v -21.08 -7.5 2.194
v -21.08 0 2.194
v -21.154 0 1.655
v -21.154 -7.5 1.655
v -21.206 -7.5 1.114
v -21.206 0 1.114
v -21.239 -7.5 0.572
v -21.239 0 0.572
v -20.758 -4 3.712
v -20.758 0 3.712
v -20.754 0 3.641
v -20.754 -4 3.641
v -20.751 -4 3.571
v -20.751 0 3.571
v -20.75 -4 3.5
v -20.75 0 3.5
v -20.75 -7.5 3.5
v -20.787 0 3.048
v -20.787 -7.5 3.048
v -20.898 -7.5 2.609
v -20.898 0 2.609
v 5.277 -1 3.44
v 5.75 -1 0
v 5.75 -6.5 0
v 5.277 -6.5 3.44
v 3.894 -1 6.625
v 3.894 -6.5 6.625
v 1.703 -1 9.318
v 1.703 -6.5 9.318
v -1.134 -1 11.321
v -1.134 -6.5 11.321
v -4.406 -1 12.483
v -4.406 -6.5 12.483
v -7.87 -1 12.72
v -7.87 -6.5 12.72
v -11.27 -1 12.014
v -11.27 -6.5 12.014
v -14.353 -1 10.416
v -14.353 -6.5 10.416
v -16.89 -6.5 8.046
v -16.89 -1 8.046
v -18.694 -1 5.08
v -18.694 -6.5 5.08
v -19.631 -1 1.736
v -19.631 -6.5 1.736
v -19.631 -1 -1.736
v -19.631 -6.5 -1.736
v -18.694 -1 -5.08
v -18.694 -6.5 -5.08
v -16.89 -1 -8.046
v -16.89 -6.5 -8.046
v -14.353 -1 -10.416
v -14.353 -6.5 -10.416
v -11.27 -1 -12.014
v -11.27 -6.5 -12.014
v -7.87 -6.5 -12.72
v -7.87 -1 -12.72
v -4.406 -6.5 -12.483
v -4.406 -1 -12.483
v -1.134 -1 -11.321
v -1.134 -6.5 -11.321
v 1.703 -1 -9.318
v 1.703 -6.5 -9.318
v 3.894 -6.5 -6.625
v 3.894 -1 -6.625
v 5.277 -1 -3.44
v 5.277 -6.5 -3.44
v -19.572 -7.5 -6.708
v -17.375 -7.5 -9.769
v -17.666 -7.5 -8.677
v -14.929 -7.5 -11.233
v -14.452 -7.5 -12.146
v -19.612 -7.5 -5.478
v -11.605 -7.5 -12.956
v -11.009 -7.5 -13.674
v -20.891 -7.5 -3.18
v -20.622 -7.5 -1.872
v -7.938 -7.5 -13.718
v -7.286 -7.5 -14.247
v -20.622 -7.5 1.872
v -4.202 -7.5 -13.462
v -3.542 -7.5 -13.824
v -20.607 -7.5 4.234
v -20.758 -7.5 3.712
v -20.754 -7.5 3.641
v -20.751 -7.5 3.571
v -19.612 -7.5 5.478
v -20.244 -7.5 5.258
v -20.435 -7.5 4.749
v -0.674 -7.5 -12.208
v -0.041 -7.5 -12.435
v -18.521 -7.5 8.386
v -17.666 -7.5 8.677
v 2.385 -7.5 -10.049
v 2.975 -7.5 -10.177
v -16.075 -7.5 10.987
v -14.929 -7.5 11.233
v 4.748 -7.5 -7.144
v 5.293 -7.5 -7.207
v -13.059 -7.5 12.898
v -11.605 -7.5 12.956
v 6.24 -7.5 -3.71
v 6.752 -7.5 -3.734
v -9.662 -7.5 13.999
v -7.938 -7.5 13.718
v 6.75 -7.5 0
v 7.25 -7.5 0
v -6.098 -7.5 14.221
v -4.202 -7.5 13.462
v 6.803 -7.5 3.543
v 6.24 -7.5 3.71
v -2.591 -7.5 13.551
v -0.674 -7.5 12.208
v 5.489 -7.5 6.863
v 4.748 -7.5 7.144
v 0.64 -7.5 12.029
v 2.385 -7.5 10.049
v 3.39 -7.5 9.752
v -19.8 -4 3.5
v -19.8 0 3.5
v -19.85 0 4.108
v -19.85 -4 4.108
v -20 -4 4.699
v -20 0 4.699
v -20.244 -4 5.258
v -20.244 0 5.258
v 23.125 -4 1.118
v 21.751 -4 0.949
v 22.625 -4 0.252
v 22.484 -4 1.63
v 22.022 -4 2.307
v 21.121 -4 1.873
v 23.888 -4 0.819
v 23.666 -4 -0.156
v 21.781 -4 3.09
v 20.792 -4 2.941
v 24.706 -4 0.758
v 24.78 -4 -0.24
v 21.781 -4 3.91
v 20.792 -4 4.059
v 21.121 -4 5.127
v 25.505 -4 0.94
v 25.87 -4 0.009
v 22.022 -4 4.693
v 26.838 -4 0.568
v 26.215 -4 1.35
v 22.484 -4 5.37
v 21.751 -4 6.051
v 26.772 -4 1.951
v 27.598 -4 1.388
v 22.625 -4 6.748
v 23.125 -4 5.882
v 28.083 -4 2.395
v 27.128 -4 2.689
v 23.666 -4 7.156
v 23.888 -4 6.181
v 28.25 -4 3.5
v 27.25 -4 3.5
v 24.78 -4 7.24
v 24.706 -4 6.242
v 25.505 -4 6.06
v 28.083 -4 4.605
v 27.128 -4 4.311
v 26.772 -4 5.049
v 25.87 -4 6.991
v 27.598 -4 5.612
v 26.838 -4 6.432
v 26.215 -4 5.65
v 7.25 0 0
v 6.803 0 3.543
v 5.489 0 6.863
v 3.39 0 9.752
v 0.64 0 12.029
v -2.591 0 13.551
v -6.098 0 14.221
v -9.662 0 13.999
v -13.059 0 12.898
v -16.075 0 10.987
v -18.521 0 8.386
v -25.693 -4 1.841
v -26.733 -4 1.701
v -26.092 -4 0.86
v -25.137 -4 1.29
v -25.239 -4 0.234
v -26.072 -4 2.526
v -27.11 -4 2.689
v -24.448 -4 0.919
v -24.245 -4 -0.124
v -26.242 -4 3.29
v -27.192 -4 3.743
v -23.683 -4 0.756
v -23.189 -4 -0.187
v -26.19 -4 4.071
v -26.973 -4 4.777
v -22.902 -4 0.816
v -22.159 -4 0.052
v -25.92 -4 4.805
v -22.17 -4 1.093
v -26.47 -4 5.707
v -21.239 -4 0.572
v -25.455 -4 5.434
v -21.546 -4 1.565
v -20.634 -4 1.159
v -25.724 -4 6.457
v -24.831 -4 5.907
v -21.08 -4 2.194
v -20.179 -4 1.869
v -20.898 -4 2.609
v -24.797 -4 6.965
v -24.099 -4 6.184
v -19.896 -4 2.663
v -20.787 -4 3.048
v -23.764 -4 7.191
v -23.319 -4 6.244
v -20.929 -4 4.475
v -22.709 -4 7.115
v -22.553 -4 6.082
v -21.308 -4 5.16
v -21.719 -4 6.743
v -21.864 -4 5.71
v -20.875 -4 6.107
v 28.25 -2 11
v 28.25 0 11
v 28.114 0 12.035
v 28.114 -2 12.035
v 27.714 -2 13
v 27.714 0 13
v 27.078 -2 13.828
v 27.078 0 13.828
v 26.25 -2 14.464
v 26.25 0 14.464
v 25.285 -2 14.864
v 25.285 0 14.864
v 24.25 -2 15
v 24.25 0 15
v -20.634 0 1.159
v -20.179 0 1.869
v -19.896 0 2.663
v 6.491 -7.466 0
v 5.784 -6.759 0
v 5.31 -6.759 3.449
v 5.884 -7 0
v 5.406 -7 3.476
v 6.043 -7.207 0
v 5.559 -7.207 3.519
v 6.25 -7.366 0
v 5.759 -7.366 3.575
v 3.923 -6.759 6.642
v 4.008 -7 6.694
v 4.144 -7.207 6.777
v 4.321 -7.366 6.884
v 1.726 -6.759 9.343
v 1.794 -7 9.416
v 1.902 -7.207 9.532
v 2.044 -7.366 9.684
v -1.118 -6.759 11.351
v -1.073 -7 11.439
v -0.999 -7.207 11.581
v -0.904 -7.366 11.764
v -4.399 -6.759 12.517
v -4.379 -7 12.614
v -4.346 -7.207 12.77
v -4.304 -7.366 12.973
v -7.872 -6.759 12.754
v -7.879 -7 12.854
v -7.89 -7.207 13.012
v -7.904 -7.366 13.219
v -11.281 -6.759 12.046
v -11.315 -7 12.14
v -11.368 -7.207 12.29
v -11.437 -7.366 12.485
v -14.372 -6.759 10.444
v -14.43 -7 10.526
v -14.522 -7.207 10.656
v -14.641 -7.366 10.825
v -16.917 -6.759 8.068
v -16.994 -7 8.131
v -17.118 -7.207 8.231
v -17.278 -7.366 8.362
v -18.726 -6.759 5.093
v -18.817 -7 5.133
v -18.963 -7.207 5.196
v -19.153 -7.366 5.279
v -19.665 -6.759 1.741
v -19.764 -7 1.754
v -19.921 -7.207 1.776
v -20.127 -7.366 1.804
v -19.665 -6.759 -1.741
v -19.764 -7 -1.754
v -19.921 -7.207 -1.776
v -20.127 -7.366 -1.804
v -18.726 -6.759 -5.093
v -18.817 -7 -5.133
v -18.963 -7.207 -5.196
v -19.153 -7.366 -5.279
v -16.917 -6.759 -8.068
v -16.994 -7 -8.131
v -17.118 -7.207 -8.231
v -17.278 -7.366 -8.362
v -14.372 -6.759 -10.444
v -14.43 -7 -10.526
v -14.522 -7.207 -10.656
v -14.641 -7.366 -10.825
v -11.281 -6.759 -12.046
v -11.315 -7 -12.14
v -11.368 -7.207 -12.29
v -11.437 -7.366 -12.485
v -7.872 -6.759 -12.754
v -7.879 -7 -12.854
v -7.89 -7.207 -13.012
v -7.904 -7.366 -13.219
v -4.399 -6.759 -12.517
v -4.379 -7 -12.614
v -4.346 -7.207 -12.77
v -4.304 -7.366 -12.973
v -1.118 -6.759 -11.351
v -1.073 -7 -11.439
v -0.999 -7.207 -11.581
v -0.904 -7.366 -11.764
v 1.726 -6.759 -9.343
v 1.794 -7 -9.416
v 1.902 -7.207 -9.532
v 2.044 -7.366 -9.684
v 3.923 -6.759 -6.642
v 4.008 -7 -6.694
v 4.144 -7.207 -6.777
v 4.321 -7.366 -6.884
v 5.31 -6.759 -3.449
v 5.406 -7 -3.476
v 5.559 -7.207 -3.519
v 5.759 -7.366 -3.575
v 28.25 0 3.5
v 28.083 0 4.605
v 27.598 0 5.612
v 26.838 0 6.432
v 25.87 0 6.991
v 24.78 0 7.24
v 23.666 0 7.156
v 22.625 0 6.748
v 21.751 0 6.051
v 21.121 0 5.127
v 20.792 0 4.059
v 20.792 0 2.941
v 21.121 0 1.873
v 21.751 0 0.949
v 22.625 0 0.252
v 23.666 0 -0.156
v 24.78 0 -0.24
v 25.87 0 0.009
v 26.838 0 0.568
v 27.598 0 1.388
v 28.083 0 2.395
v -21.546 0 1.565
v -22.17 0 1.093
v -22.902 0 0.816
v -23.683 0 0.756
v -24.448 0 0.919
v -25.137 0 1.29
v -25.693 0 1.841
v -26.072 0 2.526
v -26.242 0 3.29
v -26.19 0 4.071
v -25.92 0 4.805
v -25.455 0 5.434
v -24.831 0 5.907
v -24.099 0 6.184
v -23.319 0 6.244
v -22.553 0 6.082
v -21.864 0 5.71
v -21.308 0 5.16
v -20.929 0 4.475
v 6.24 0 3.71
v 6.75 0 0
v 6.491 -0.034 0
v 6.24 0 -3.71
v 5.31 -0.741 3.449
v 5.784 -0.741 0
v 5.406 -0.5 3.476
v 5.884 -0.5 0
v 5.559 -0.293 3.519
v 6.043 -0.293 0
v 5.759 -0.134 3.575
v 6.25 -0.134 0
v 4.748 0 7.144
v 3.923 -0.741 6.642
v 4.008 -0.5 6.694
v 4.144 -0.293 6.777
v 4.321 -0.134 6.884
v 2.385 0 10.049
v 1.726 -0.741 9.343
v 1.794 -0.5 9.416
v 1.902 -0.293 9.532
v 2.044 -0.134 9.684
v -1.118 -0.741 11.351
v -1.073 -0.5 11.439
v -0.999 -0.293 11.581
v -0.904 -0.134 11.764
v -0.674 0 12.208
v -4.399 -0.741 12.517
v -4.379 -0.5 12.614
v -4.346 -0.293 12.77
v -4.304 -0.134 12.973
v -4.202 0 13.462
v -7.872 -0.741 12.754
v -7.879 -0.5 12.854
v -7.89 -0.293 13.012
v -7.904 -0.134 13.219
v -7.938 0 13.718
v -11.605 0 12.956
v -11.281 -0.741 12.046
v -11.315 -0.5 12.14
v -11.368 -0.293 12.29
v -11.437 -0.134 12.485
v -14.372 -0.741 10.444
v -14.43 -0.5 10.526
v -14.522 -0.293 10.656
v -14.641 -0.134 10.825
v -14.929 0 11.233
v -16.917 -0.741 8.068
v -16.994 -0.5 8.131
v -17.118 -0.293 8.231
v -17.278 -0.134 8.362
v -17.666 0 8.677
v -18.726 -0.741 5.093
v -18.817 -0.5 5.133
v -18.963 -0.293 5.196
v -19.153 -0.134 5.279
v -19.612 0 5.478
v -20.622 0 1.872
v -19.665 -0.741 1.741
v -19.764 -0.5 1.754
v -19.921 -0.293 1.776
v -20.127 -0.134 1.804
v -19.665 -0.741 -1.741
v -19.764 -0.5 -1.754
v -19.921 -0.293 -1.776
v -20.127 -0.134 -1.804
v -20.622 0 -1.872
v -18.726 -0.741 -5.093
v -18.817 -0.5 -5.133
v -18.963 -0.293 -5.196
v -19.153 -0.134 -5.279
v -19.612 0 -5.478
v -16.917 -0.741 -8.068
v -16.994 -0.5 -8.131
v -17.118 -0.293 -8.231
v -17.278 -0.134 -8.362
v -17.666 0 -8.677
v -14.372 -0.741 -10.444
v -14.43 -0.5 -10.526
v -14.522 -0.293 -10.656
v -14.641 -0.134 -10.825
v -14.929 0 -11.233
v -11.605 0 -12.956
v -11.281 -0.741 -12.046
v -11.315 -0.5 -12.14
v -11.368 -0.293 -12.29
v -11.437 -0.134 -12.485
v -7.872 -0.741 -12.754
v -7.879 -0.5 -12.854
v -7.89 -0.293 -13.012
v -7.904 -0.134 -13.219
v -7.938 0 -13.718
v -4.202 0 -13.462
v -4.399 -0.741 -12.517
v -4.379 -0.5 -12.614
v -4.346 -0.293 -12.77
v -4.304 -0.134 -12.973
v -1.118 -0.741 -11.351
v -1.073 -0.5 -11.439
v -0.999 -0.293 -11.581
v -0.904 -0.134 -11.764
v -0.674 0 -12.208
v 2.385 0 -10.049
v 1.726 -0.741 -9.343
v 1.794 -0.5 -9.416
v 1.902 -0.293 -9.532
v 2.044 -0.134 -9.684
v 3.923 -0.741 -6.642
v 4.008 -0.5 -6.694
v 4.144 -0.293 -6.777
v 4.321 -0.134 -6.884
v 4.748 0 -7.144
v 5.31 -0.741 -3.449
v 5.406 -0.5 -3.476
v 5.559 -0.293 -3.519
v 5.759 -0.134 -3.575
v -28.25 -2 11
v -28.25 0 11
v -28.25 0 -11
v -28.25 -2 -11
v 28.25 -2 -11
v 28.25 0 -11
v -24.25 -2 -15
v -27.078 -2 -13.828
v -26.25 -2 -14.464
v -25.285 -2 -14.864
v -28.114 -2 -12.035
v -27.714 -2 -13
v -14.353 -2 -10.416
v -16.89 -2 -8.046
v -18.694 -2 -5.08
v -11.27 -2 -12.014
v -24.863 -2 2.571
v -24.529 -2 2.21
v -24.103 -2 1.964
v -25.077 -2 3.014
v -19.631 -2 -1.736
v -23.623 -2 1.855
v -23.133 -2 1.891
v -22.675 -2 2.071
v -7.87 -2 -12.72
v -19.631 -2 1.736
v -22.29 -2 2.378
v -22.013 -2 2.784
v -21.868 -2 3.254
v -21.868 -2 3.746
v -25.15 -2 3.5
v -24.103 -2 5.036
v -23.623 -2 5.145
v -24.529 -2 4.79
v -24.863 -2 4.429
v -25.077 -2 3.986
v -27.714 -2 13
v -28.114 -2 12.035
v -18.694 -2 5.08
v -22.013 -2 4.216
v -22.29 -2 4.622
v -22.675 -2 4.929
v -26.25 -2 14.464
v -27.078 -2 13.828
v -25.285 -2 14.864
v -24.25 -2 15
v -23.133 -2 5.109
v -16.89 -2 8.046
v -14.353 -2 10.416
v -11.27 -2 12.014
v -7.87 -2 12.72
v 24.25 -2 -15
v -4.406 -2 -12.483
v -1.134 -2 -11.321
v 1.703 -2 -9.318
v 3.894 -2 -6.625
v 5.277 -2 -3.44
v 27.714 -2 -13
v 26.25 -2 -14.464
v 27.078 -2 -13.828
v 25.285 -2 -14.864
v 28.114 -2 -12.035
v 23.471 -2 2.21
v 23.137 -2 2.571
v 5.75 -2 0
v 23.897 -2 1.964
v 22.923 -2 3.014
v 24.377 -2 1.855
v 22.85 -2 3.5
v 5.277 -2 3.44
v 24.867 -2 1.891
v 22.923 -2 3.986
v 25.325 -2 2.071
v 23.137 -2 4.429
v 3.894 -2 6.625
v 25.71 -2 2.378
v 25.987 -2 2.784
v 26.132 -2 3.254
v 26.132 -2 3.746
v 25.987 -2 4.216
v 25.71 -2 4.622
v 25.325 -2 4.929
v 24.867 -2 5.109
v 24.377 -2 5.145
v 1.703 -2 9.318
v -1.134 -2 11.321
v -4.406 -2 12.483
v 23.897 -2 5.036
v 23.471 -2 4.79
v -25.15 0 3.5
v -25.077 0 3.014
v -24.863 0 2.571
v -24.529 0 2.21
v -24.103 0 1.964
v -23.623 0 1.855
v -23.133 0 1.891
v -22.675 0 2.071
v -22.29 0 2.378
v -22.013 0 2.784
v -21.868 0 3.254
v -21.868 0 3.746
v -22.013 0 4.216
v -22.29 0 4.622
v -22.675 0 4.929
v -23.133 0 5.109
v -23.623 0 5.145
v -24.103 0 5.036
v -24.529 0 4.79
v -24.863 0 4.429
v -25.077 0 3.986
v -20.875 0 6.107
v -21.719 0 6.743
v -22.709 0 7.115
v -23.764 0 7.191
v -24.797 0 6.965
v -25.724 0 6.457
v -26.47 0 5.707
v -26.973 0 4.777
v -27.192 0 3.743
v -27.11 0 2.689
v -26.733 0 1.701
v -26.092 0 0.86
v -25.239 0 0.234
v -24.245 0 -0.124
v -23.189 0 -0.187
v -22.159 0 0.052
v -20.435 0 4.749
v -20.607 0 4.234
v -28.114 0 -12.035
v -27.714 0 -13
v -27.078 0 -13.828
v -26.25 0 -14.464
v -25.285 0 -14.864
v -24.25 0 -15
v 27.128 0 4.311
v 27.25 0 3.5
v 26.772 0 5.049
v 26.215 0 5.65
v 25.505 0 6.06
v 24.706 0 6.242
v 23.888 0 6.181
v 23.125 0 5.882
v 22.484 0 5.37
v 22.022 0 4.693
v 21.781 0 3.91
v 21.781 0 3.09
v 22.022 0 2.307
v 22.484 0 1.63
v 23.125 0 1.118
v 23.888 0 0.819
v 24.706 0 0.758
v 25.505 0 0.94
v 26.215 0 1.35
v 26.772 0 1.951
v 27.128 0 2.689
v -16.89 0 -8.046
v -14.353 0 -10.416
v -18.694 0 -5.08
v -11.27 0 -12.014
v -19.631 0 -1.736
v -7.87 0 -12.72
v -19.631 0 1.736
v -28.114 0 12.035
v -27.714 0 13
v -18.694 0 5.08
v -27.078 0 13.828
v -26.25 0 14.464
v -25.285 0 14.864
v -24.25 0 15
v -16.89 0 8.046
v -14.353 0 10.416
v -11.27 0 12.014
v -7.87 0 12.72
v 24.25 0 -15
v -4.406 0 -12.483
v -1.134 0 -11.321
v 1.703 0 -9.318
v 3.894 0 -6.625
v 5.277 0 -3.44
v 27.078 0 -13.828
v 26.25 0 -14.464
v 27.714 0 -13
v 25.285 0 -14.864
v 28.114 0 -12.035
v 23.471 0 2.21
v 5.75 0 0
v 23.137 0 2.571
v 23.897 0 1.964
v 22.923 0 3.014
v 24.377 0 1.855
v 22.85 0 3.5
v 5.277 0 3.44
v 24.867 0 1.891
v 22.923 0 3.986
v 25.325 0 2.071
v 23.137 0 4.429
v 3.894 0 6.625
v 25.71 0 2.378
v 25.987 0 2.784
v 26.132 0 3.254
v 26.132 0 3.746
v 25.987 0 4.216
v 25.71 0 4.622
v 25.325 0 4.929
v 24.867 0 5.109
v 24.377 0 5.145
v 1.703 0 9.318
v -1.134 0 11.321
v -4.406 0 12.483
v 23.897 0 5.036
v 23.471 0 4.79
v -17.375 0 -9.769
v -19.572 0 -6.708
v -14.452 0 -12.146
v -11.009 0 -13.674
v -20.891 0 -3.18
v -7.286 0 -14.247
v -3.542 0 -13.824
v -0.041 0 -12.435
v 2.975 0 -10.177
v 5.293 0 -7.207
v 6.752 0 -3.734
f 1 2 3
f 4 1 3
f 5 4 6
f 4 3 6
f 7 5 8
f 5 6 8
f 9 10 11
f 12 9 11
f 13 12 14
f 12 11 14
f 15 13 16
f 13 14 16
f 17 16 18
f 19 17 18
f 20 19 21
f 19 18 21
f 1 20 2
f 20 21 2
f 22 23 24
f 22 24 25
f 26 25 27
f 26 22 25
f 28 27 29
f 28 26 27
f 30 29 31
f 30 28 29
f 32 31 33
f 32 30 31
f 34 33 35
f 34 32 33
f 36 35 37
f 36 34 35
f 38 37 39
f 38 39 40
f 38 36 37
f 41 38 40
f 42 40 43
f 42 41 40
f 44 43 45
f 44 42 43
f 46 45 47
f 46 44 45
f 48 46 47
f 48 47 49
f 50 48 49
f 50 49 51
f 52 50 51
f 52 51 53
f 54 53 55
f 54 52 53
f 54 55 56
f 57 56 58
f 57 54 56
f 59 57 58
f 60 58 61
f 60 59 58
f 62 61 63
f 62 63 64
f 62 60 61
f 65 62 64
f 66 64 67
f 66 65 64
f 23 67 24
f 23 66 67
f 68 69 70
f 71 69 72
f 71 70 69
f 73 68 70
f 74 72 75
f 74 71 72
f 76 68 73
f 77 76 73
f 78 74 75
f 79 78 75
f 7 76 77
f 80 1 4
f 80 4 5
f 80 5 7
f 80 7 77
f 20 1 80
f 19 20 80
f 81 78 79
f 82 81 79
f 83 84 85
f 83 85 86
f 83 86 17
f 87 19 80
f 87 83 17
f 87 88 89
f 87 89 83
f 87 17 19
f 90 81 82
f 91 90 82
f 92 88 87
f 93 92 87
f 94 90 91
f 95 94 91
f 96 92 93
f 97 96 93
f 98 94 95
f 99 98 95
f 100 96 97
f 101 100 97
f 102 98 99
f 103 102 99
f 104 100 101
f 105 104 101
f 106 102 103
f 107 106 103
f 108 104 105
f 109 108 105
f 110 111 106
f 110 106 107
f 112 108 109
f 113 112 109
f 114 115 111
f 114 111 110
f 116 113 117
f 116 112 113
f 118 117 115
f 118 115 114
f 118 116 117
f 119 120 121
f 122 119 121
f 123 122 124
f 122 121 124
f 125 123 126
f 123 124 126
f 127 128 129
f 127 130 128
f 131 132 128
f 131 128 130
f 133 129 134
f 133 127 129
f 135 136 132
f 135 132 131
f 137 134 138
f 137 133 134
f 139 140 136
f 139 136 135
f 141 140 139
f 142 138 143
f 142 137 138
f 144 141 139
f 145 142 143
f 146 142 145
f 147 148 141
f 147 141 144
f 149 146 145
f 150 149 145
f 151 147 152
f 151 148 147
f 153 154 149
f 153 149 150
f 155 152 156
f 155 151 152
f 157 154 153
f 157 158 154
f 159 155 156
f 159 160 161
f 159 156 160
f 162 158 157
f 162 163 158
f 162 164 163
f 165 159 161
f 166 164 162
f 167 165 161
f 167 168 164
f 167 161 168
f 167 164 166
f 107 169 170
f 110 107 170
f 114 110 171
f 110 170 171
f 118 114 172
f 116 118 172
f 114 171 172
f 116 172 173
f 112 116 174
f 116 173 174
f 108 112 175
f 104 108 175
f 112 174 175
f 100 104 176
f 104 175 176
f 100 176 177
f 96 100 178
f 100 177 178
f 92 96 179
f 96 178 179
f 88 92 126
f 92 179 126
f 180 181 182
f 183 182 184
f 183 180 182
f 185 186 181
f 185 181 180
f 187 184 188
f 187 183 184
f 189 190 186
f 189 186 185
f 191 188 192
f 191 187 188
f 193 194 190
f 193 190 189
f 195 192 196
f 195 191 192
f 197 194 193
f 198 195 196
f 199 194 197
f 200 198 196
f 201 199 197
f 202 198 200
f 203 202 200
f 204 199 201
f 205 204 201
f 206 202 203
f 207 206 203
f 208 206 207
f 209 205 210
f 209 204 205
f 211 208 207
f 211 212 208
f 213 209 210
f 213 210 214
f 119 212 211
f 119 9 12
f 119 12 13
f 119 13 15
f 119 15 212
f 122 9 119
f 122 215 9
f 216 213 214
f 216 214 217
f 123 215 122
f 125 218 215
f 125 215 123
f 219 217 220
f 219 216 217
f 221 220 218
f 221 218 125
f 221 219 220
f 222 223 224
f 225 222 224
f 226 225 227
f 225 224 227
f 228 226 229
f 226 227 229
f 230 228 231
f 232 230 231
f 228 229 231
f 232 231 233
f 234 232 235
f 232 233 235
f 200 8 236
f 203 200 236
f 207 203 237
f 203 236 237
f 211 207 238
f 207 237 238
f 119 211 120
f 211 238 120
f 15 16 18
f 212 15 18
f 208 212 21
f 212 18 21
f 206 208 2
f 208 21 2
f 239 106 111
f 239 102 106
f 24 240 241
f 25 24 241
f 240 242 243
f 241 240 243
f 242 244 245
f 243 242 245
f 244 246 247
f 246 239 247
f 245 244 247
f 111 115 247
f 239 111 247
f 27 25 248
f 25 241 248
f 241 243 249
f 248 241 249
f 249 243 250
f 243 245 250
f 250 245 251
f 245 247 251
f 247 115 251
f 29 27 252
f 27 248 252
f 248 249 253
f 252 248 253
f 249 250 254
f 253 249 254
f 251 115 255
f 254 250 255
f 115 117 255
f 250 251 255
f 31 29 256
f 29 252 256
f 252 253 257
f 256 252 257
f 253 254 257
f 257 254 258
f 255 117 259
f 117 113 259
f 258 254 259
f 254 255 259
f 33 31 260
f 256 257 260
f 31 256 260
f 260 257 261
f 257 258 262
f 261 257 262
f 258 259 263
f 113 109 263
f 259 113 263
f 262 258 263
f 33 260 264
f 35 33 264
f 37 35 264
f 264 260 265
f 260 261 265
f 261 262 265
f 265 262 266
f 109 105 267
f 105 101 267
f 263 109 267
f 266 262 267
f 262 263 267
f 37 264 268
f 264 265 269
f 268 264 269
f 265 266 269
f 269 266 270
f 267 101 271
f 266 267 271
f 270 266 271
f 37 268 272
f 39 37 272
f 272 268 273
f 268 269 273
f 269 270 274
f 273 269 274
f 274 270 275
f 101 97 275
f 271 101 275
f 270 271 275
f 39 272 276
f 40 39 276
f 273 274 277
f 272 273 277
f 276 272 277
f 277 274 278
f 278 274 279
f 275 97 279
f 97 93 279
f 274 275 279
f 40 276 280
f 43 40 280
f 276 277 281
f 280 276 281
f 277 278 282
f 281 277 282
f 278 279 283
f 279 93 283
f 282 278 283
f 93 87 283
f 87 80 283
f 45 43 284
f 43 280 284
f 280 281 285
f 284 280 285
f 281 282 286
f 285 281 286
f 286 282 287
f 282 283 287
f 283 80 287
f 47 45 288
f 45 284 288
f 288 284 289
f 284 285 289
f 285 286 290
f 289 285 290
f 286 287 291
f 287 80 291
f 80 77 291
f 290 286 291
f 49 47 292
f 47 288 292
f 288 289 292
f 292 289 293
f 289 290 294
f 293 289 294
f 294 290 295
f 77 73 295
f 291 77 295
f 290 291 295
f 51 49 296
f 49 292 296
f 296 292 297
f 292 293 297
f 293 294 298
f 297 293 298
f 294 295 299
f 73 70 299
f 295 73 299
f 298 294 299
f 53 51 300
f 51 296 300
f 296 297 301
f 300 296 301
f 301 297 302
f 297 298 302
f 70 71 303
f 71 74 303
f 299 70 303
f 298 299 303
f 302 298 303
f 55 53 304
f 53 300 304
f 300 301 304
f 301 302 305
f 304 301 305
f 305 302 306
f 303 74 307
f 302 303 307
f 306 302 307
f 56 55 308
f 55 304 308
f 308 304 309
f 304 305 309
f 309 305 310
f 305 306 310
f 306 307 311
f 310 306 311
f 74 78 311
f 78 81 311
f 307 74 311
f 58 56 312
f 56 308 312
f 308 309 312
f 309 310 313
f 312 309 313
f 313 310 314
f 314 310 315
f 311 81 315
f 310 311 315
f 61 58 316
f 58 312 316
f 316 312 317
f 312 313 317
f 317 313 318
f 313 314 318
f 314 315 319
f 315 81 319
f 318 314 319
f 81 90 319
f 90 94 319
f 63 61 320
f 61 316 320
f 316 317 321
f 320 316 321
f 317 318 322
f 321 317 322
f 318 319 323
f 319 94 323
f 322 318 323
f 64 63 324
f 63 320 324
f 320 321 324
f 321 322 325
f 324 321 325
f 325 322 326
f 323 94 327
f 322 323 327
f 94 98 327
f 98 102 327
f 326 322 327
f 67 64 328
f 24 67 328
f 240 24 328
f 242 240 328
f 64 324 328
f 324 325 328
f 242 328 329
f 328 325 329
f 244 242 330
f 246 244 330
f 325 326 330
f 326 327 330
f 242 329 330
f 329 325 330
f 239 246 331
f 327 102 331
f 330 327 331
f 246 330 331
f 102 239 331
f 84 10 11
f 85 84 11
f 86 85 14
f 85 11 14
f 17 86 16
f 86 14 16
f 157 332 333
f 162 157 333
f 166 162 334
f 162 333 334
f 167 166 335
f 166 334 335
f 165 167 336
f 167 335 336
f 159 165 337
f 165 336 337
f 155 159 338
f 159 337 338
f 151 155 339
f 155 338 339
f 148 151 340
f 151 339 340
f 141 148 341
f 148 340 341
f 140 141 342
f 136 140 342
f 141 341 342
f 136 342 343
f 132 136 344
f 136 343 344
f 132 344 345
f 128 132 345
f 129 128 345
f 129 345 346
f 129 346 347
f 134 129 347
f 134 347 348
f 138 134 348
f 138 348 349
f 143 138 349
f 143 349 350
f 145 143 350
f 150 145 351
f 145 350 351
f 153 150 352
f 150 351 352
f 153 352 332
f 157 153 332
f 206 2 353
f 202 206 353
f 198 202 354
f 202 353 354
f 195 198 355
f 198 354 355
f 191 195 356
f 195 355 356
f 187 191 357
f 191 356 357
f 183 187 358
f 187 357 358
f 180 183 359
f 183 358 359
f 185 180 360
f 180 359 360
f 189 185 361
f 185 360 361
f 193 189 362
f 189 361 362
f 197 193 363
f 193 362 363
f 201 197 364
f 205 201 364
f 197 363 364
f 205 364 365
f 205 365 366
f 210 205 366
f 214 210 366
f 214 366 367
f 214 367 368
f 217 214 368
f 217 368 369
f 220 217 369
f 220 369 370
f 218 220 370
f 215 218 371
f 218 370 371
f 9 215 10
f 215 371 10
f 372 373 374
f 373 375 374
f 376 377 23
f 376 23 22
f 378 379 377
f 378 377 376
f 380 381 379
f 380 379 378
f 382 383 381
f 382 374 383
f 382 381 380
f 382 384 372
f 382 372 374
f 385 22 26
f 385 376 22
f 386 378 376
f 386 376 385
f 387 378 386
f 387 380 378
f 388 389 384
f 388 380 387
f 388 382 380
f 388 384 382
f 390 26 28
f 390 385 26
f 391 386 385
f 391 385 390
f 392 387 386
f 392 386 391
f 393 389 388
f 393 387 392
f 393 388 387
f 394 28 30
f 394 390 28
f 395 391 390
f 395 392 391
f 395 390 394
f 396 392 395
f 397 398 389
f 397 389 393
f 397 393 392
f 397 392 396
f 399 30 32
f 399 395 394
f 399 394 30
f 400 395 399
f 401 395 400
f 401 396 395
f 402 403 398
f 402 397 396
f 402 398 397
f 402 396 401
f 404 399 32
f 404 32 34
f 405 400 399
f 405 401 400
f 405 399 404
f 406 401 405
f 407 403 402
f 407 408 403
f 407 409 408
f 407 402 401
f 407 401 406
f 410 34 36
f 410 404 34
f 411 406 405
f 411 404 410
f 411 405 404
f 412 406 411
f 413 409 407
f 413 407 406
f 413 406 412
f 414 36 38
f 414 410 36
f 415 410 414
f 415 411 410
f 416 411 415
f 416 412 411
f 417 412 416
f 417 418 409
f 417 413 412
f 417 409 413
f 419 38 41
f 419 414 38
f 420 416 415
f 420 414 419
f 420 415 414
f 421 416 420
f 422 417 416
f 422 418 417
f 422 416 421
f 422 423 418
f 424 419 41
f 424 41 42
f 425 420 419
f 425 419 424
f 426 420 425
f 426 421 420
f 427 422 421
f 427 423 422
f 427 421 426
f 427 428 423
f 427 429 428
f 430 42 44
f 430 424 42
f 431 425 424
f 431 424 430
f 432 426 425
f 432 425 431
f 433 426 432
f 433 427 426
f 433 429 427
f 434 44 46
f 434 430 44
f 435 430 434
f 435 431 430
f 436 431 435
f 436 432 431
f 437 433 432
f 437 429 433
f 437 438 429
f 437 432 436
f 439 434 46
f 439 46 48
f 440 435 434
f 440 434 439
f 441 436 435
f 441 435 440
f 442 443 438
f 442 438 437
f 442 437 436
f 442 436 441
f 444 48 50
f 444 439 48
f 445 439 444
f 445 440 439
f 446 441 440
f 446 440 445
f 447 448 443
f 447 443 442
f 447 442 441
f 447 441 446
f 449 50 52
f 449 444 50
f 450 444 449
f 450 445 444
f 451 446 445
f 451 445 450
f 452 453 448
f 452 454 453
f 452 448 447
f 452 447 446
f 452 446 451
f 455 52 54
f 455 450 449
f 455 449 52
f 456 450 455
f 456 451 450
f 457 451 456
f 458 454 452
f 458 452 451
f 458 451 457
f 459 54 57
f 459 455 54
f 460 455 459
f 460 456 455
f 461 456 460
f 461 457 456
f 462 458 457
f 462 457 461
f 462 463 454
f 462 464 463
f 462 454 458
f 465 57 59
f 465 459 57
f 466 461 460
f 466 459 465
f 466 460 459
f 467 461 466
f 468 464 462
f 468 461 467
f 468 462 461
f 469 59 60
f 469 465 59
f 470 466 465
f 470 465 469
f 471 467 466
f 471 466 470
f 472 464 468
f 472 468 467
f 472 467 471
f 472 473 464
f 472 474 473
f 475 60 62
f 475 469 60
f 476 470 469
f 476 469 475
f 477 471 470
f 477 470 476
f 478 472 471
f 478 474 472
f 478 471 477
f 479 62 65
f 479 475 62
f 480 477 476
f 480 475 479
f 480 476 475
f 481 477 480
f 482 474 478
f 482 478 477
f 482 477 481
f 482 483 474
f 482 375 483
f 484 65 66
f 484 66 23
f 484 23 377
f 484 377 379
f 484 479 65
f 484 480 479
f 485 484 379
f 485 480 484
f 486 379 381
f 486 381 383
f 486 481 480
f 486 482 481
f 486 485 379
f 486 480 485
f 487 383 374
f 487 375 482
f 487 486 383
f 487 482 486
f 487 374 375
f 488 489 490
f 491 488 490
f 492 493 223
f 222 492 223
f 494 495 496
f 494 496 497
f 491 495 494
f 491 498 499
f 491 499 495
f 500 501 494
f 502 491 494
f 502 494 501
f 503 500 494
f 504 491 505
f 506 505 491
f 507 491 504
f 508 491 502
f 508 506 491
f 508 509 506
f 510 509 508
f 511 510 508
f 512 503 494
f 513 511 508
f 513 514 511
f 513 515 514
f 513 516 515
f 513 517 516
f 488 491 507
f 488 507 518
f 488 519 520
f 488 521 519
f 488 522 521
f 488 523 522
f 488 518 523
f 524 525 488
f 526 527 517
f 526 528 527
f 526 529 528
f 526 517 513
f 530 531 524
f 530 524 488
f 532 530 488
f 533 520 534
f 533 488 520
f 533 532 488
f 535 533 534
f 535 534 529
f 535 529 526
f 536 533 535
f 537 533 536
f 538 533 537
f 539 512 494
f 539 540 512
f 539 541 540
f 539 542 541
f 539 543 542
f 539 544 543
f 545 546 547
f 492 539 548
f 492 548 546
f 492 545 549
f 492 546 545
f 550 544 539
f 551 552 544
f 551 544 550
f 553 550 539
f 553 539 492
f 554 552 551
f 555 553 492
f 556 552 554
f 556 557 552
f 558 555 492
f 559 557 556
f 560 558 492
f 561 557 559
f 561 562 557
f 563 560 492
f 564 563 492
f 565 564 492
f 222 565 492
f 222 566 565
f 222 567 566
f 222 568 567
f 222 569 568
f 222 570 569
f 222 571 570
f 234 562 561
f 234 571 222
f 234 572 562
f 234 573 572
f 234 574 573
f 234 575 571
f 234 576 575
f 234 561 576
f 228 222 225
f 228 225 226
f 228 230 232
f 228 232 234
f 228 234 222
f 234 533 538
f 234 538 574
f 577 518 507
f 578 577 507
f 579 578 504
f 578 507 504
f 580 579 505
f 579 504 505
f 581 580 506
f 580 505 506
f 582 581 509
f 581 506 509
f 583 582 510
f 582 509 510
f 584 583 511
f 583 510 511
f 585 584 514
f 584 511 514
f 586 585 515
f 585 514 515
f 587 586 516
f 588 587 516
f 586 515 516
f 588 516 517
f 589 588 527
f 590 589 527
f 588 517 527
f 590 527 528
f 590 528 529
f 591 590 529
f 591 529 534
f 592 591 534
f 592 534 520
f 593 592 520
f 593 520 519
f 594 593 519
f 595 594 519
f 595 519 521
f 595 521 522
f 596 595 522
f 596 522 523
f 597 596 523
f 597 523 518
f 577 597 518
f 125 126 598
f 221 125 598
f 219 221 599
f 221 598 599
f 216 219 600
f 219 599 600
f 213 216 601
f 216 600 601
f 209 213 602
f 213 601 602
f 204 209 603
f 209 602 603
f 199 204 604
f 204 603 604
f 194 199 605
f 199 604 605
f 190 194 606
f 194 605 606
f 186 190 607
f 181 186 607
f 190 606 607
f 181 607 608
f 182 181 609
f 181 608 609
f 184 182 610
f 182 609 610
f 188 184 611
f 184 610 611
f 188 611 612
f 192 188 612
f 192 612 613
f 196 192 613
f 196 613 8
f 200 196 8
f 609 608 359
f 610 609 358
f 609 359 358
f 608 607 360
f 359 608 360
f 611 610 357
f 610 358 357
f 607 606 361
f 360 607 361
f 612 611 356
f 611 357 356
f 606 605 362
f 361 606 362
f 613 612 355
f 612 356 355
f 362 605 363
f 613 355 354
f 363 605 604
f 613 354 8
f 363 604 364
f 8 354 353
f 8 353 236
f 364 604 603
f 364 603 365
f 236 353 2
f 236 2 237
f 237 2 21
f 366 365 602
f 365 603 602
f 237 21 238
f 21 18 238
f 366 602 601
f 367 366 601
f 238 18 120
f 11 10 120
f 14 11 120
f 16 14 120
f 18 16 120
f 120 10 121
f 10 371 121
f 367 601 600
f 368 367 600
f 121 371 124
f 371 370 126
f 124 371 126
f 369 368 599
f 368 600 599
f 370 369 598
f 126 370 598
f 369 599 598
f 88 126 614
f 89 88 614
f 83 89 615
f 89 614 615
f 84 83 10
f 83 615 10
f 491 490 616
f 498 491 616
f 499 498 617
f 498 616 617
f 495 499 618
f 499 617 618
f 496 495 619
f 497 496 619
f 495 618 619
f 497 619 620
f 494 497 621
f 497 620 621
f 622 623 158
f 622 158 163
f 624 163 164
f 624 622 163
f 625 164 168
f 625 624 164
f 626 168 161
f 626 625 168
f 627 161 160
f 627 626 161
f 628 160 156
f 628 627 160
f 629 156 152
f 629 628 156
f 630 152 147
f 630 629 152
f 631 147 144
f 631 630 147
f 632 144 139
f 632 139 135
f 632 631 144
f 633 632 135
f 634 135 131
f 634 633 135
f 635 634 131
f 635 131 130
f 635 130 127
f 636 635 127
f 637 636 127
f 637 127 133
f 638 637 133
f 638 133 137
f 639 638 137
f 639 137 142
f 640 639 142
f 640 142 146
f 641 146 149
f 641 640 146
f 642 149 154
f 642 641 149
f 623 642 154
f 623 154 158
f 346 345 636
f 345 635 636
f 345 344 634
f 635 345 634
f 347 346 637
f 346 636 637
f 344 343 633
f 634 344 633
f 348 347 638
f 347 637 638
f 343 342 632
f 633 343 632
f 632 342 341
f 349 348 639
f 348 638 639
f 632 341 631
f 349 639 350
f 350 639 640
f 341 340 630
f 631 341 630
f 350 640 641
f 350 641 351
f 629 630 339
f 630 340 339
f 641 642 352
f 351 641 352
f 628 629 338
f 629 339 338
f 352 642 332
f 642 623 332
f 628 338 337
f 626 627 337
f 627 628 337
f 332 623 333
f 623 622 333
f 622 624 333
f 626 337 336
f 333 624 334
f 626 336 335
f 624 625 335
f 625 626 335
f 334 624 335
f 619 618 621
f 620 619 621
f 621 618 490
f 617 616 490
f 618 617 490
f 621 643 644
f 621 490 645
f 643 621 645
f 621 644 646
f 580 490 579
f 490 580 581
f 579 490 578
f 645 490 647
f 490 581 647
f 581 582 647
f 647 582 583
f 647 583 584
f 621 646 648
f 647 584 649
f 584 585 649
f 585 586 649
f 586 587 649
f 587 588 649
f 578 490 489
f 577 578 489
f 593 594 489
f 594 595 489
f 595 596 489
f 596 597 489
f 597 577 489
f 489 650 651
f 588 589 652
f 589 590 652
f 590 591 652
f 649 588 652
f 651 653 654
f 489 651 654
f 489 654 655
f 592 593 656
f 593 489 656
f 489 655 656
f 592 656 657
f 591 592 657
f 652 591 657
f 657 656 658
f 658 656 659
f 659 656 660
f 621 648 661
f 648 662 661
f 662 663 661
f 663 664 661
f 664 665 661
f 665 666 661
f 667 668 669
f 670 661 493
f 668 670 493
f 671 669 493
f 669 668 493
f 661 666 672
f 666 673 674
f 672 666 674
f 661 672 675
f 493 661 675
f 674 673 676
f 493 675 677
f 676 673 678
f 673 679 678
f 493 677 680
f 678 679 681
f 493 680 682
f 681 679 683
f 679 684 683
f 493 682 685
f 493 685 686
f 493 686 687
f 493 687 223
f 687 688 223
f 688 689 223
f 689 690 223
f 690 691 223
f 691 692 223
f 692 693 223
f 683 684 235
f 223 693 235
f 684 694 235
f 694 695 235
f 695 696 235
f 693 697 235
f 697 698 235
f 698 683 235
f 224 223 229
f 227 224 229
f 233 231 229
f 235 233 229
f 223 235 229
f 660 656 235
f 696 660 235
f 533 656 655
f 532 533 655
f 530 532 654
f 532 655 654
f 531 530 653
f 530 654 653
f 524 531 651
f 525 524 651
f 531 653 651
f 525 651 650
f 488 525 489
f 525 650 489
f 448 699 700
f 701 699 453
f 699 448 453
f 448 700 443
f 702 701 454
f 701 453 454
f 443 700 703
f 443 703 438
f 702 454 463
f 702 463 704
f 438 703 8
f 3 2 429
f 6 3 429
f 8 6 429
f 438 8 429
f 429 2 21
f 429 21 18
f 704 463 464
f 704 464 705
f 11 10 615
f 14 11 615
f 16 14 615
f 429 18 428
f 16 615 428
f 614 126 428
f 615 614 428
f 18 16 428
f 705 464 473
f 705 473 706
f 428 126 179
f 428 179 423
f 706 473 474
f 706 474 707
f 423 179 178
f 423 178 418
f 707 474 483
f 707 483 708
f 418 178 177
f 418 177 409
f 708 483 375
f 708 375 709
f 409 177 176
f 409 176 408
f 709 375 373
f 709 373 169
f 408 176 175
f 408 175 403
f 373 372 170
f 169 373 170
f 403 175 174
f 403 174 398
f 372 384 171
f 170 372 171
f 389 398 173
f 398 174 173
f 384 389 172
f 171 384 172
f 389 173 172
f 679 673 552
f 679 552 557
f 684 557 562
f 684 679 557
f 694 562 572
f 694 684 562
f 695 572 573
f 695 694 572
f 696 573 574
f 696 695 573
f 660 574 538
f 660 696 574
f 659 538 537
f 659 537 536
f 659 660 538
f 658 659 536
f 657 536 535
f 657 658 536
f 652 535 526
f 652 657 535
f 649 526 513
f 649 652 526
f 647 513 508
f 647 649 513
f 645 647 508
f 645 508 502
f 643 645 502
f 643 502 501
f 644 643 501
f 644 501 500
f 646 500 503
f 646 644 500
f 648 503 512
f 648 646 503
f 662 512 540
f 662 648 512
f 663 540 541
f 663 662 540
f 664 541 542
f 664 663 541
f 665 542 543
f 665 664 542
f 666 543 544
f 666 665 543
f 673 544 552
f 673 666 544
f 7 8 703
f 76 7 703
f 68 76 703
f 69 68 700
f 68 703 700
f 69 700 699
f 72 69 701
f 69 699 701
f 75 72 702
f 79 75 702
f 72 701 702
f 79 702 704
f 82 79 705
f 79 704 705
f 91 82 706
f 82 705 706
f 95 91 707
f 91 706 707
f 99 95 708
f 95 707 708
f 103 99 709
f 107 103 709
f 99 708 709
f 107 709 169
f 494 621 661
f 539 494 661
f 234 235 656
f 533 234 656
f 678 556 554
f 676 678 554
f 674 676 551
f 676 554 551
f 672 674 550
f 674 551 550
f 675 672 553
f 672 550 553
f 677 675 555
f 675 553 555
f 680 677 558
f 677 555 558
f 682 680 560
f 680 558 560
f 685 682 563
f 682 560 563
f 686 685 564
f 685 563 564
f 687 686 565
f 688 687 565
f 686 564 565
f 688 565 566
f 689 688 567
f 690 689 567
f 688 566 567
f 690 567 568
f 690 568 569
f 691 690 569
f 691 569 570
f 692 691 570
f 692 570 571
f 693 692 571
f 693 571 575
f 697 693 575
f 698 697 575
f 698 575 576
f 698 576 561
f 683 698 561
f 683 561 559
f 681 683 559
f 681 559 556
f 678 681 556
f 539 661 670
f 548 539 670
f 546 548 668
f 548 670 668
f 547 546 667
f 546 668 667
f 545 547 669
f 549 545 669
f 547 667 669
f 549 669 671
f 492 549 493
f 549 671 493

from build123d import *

# Parameters (mm, degrees)
F1_DEPTH = 4
F0_R     = 3.75
F0_R_2   = 2.75
F0_R_3   = 12.75
F2_DEPTH = 7.5
F3_R     = 1
F4_DEPTH = 2
F5_D     = 3.3
F5_DEPTH = 13.5
F5_TIP   = 0.9914200214


with BuildPart() as f1:
    # F0 (on Front) → F1 (new body)
    with BuildSketch(Plane.XZ):
        with BuildLine():
            ThreePointArc((-20.7581509246, 3.7115742128), (-20.5234057924, 4.4922150187), (-20.244406426, 5.2581554201))
            ThreePointArc((-20.244406426, 5.2581554201), (-27.1194662629, 4.2677655709), (-21.2385329413, 0.5715589912))
            ThreePointArc((-21.2385329413, 0.5715589912), (-21.1825530428, 1.3848065524), (-21.080161905, 2.193522448))
            ThreePointArc((-21.080161905, 2.193522448), (-26.190143844, 4.070636573), (-20.7581509246, 3.7115742128))
        make_face()
        with BuildLine():
            ThreePointArc((-19.8, 3.5), (-19.9128217062, 4.4067259168), (-20.244406426, 5.2581554201))
            ThreePointArc((-20.244406426, 5.2581554201), (-20.5234057924, 4.4922150187), (-20.7581509246, 3.7115742128))
            ThreePointArc((-20.7581509246, 3.7115742128), (-20.7520384867, 3.6058655811), (-20.75, 3.5))
            ThreePointArc((-20.75, 3.5), (-20.8338178268, 2.8262250974), (-21.080161905, 2.193522448))
            ThreePointArc((-21.080161905, 2.193522448), (-21.1825530428, 1.3848065524), (-21.2385329413, 0.5715589912))
            ThreePointArc((-21.2385329413, 0.5715589912), (-20.1790492237, 1.868655174), (-19.8, 3.5))
        make_face()
    extrude(amount=F1_DEPTH)


with BuildPart() as f1b:
    # F0 (on Front) → F1, piece 2 (new body)
    with BuildSketch(Plane.XZ):
        with Locations((24.5, 3.5)):
            Circle(F0_R)
        with Locations((24.5, 3.5)):
            Circle(F0_R_2, mode=Mode.SUBTRACT)
    extrude(amount=F1_DEPTH)


with BuildPart() as f2:
    # F0 (on Front) → F2 (new body)
    with BuildSketch(Plane.XZ):
        with BuildLine():
            ThreePointArc((-21.2385329413, 0.5715589912), (-7.285837005, -14.2471329469), (7.25, 0))
            ThreePointArc((7.25, 0), (-4.3232754691, 13.996344015), (-20.244406426, 5.2581554201))
            ThreePointArc((-20.244406426, 5.2581554201), (-19.9128217062, 4.4067259168), (-19.8, 3.5))
            ThreePointArc((-19.8, 3.5), (-20.1790492237, 1.868655174), (-21.2385329413, 0.5715589912))
        make_face()
        with Locations((-7, 0)):
            Circle(F0_R_3, mode=Mode.SUBTRACT)
        with BuildLine():
            ThreePointArc((-19.8, 3.5), (-19.9128217062, 4.4067259168), (-20.244406426, 5.2581554201))
            ThreePointArc((-20.244406426, 5.2581554201), (-20.5234057924, 4.4922150187), (-20.7581509246, 3.7115742128))
            ThreePointArc((-20.7581509246, 3.7115742128), (-20.7520384867, 3.6058655811), (-20.75, 3.5))
            ThreePointArc((-20.75, 3.5), (-20.8338178268, 2.8262250974), (-21.080161905, 2.193522448))
            ThreePointArc((-21.080161905, 2.193522448), (-21.1825530428, 1.3848065524), (-21.2385329413, 0.5715589912))
            ThreePointArc((-21.2385329413, 0.5715589912), (-20.1790492237, 1.868655174), (-19.8, 3.5))
        make_face()
    extrude(amount=F2_DEPTH)

    # F3
    f3_edges = [f2.edges().sort_by_distance(p)[0] for p in [
        (-19.75, -7.5, 0),
        (-19.75, 0, 0),
    ]]
    fillet(f3_edges, radius=F3_R)


with BuildPart() as f4:
    # F0 (on Front) → F4 (new body)
    with BuildSketch(Plane.XZ):
        with BuildLine():
            Line((-24.25, -15), (24.25, -15))
            ThreePointArc((24.25, -15), (27.0784271247, -13.8284271247), (28.25, -11))
            Line((28.25, -11), (28.25, 3.5))
            Line((28.25, 3.5), (28.25, 11))
            ThreePointArc((28.25, 11), (27.0784271247, 13.8284271247), (24.25, 15))
            Line((24.25, 15), (-24.25, 15))
            ThreePointArc((-24.25, 15), (-27.0784271247, 13.8284271247), (-28.25, 11))
            Line((-28.25, 11), (-28.25, -11))
            ThreePointArc((-28.25, -11), (-27.0784271247, -13.8284271247), (-24.25, -15))
        make_face()
        with BuildLine():
            ThreePointArc((-20.244406426, 5.2581554201), (-4.3232754691, 13.996344015), (7.25, 0))
            ThreePointArc((7.25, 0), (-7.285837005, -14.2471329469), (-21.2385329413, 0.5715589912))
            ThreePointArc((-21.2385329413, 0.5715589912), (-27.1194662629, 4.2677655709), (-20.244406426, 5.2581554201))
        make_face(mode=Mode.SUBTRACT)
        with Locations((24.5, 3.5)):
            Circle(F0_R, mode=Mode.SUBTRACT)
        with BuildLine():
            ThreePointArc((-21.080161905, 2.193522448), (-20.9398362827, 2.9569349691), (-20.7581509246, 3.7115742128))
            ThreePointArc((-20.7581509246, 3.7115742128), (-26.190143844, 4.070636573), (-21.080161905, 2.193522448))
        make_face()
        with Locations((24.5, 3.5)):
            Circle(F0_R)
        with Locations((24.5, 3.5)):
            Circle(F0_R_2, mode=Mode.SUBTRACT)
        with BuildLine():
            ThreePointArc((-20.7581509246, 3.7115742128), (-20.5234057924, 4.4922150187), (-20.244406426, 5.2581554201))
            ThreePointArc((-20.244406426, 5.2581554201), (-27.1194662629, 4.2677655709), (-21.2385329413, 0.5715589912))
            ThreePointArc((-21.2385329413, 0.5715589912), (-21.1825530428, 1.3848065524), (-21.080161905, 2.193522448))
            ThreePointArc((-21.080161905, 2.193522448), (-26.190143844, 4.070636573), (-20.7581509246, 3.7115742128))
        make_face()
        with BuildLine():
            ThreePointArc((-19.8, 3.5), (-19.9128217062, 4.4067259168), (-20.244406426, 5.2581554201))
            ThreePointArc((-20.244406426, 5.2581554201), (-20.5234057924, 4.4922150187), (-20.7581509246, 3.7115742128))
            ThreePointArc((-20.7581509246, 3.7115742128), (-20.7520384867, 3.6058655811), (-20.75, 3.5))
            ThreePointArc((-20.75, 3.5), (-20.8338178268, 2.8262250974), (-21.080161905, 2.193522448))
            ThreePointArc((-21.080161905, 2.193522448), (-21.1825530428, 1.3848065524), (-21.2385329413, 0.5715589912))
            ThreePointArc((-21.2385329413, 0.5715589912), (-20.1790492237, 1.868655174), (-19.8, 3.5))
        make_face()
        with BuildLine():
            ThreePointArc((-20.75, 3.5), (-20.7520384867, 3.6058655811), (-20.7581509246, 3.7115742128))
            ThreePointArc((-20.7581509246, 3.7115742128), (-20.9398362827, 2.9569349691), (-21.080161905, 2.193522448))
            ThreePointArc((-21.080161905, 2.193522448), (-20.8338178268, 2.8262250974), (-20.75, 3.5))
        make_face()
        with BuildLine():
            ThreePointArc((-21.2385329413, 0.5715589912), (-7.285837005, -14.2471329469), (7.25, 0))
            ThreePointArc((7.25, 0), (-4.3232754691, 13.996344015), (-20.244406426, 5.2581554201))
            ThreePointArc((-20.244406426, 5.2581554201), (-19.9128217062, 4.4067259168), (-19.8, 3.5))
            ThreePointArc((-19.8, 3.5), (-20.1790492237, 1.868655174), (-21.2385329413, 0.5715589912))
        make_face()
        with Locations((-7, 0)):
            Circle(F0_R_3, mode=Mode.SUBTRACT)
        with Locations((24.5, 3.5)):
            Circle(F0_R_2)
    extrude(amount=F4_DEPTH)

    # F5
    with Locations(Plane(origin=(0, 0, 0), x_dir=(1, 0, 0), z_dir=(0, 1, 0))):
        with Locations((24.5, -3.5), (-23.5, -3.5)):
            Hole(F5_D / 2, depth=F5_DEPTH)
            with Locations((0, 0, -(F5_DEPTH + F5_TIP / 2))):  # 118° drill point
                Cone(0, F5_D / 2, F5_TIP, mode=Mode.SUBTRACT)


solid = Compound([f1.part, f1b.part, f2.part, f4.part])
